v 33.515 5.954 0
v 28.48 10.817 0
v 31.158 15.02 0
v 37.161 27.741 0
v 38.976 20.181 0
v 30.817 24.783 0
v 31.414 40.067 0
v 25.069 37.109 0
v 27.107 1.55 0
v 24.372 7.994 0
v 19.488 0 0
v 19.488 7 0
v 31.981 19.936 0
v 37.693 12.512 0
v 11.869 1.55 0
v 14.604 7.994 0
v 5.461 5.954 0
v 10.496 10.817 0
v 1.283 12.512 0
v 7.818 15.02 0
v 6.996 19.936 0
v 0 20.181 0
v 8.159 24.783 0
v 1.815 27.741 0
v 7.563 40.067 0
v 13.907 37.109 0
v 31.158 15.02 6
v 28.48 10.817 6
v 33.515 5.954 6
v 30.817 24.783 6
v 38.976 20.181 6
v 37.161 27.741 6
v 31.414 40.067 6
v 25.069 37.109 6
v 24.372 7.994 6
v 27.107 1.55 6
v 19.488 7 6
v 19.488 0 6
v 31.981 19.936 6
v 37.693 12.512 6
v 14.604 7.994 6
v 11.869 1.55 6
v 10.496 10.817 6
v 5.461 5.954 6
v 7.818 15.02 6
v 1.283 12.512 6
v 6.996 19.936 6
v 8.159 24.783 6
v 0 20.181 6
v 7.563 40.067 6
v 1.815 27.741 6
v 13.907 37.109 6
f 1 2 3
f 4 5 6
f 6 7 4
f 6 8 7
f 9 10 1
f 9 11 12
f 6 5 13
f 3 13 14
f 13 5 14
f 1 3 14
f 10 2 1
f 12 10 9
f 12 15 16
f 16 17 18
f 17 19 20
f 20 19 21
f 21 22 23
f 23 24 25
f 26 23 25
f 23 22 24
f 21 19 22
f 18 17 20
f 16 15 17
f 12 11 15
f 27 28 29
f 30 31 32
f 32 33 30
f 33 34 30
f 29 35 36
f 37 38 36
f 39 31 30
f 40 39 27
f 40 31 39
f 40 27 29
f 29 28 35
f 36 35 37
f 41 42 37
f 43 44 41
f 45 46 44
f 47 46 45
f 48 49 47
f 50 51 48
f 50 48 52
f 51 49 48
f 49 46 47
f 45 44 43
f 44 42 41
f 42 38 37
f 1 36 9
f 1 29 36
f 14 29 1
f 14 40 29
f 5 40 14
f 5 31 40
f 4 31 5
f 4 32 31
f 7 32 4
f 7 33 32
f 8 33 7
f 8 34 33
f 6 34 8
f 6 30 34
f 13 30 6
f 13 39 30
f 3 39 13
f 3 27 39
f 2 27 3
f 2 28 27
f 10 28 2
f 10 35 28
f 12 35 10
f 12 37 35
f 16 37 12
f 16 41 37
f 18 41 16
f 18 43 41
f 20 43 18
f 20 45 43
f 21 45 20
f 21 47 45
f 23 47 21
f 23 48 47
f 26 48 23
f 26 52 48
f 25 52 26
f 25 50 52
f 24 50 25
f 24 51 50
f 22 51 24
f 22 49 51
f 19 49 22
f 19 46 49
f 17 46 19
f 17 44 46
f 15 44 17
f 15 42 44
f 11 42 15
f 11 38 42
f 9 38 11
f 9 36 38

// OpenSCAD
$fn = 32;

// ----------------------------------------------------------------------
// Clip blank: omega clip, 6 mm thick
// ----------------------------------------------------------------------

// --- parameters (mm) ---
profile_height = 6;       // extrusion height
profile_points = 26;      // points of the closed outline

profile = [[1.815, 27.741], [0, 20.181], [1.283, 12.512], [5.461, 5.954], [11.869, 1.55], [19.488, 0], [27.107, 1.55], [33.515, 5.954], [37.693, 12.512], [38.976, 20.181], [37.161, 27.741], [31.414, 40.067], [25.069, 37.109], [30.817, 24.783], [31.981, 19.936], [31.158, 15.02], [28.48, 10.817], [24.372, 7.994], [19.488, 7], [14.604, 7.994], [10.496, 10.817], [7.818, 15.02], [6.996, 19.936], [8.159, 24.783], [13.907, 37.109], [7.563, 40.067]];  // single closed polygon, 26 points, counter clockwise

// --- the one profile operation ---
linear_extrude(height = profile_height) polygon(points = profile);
